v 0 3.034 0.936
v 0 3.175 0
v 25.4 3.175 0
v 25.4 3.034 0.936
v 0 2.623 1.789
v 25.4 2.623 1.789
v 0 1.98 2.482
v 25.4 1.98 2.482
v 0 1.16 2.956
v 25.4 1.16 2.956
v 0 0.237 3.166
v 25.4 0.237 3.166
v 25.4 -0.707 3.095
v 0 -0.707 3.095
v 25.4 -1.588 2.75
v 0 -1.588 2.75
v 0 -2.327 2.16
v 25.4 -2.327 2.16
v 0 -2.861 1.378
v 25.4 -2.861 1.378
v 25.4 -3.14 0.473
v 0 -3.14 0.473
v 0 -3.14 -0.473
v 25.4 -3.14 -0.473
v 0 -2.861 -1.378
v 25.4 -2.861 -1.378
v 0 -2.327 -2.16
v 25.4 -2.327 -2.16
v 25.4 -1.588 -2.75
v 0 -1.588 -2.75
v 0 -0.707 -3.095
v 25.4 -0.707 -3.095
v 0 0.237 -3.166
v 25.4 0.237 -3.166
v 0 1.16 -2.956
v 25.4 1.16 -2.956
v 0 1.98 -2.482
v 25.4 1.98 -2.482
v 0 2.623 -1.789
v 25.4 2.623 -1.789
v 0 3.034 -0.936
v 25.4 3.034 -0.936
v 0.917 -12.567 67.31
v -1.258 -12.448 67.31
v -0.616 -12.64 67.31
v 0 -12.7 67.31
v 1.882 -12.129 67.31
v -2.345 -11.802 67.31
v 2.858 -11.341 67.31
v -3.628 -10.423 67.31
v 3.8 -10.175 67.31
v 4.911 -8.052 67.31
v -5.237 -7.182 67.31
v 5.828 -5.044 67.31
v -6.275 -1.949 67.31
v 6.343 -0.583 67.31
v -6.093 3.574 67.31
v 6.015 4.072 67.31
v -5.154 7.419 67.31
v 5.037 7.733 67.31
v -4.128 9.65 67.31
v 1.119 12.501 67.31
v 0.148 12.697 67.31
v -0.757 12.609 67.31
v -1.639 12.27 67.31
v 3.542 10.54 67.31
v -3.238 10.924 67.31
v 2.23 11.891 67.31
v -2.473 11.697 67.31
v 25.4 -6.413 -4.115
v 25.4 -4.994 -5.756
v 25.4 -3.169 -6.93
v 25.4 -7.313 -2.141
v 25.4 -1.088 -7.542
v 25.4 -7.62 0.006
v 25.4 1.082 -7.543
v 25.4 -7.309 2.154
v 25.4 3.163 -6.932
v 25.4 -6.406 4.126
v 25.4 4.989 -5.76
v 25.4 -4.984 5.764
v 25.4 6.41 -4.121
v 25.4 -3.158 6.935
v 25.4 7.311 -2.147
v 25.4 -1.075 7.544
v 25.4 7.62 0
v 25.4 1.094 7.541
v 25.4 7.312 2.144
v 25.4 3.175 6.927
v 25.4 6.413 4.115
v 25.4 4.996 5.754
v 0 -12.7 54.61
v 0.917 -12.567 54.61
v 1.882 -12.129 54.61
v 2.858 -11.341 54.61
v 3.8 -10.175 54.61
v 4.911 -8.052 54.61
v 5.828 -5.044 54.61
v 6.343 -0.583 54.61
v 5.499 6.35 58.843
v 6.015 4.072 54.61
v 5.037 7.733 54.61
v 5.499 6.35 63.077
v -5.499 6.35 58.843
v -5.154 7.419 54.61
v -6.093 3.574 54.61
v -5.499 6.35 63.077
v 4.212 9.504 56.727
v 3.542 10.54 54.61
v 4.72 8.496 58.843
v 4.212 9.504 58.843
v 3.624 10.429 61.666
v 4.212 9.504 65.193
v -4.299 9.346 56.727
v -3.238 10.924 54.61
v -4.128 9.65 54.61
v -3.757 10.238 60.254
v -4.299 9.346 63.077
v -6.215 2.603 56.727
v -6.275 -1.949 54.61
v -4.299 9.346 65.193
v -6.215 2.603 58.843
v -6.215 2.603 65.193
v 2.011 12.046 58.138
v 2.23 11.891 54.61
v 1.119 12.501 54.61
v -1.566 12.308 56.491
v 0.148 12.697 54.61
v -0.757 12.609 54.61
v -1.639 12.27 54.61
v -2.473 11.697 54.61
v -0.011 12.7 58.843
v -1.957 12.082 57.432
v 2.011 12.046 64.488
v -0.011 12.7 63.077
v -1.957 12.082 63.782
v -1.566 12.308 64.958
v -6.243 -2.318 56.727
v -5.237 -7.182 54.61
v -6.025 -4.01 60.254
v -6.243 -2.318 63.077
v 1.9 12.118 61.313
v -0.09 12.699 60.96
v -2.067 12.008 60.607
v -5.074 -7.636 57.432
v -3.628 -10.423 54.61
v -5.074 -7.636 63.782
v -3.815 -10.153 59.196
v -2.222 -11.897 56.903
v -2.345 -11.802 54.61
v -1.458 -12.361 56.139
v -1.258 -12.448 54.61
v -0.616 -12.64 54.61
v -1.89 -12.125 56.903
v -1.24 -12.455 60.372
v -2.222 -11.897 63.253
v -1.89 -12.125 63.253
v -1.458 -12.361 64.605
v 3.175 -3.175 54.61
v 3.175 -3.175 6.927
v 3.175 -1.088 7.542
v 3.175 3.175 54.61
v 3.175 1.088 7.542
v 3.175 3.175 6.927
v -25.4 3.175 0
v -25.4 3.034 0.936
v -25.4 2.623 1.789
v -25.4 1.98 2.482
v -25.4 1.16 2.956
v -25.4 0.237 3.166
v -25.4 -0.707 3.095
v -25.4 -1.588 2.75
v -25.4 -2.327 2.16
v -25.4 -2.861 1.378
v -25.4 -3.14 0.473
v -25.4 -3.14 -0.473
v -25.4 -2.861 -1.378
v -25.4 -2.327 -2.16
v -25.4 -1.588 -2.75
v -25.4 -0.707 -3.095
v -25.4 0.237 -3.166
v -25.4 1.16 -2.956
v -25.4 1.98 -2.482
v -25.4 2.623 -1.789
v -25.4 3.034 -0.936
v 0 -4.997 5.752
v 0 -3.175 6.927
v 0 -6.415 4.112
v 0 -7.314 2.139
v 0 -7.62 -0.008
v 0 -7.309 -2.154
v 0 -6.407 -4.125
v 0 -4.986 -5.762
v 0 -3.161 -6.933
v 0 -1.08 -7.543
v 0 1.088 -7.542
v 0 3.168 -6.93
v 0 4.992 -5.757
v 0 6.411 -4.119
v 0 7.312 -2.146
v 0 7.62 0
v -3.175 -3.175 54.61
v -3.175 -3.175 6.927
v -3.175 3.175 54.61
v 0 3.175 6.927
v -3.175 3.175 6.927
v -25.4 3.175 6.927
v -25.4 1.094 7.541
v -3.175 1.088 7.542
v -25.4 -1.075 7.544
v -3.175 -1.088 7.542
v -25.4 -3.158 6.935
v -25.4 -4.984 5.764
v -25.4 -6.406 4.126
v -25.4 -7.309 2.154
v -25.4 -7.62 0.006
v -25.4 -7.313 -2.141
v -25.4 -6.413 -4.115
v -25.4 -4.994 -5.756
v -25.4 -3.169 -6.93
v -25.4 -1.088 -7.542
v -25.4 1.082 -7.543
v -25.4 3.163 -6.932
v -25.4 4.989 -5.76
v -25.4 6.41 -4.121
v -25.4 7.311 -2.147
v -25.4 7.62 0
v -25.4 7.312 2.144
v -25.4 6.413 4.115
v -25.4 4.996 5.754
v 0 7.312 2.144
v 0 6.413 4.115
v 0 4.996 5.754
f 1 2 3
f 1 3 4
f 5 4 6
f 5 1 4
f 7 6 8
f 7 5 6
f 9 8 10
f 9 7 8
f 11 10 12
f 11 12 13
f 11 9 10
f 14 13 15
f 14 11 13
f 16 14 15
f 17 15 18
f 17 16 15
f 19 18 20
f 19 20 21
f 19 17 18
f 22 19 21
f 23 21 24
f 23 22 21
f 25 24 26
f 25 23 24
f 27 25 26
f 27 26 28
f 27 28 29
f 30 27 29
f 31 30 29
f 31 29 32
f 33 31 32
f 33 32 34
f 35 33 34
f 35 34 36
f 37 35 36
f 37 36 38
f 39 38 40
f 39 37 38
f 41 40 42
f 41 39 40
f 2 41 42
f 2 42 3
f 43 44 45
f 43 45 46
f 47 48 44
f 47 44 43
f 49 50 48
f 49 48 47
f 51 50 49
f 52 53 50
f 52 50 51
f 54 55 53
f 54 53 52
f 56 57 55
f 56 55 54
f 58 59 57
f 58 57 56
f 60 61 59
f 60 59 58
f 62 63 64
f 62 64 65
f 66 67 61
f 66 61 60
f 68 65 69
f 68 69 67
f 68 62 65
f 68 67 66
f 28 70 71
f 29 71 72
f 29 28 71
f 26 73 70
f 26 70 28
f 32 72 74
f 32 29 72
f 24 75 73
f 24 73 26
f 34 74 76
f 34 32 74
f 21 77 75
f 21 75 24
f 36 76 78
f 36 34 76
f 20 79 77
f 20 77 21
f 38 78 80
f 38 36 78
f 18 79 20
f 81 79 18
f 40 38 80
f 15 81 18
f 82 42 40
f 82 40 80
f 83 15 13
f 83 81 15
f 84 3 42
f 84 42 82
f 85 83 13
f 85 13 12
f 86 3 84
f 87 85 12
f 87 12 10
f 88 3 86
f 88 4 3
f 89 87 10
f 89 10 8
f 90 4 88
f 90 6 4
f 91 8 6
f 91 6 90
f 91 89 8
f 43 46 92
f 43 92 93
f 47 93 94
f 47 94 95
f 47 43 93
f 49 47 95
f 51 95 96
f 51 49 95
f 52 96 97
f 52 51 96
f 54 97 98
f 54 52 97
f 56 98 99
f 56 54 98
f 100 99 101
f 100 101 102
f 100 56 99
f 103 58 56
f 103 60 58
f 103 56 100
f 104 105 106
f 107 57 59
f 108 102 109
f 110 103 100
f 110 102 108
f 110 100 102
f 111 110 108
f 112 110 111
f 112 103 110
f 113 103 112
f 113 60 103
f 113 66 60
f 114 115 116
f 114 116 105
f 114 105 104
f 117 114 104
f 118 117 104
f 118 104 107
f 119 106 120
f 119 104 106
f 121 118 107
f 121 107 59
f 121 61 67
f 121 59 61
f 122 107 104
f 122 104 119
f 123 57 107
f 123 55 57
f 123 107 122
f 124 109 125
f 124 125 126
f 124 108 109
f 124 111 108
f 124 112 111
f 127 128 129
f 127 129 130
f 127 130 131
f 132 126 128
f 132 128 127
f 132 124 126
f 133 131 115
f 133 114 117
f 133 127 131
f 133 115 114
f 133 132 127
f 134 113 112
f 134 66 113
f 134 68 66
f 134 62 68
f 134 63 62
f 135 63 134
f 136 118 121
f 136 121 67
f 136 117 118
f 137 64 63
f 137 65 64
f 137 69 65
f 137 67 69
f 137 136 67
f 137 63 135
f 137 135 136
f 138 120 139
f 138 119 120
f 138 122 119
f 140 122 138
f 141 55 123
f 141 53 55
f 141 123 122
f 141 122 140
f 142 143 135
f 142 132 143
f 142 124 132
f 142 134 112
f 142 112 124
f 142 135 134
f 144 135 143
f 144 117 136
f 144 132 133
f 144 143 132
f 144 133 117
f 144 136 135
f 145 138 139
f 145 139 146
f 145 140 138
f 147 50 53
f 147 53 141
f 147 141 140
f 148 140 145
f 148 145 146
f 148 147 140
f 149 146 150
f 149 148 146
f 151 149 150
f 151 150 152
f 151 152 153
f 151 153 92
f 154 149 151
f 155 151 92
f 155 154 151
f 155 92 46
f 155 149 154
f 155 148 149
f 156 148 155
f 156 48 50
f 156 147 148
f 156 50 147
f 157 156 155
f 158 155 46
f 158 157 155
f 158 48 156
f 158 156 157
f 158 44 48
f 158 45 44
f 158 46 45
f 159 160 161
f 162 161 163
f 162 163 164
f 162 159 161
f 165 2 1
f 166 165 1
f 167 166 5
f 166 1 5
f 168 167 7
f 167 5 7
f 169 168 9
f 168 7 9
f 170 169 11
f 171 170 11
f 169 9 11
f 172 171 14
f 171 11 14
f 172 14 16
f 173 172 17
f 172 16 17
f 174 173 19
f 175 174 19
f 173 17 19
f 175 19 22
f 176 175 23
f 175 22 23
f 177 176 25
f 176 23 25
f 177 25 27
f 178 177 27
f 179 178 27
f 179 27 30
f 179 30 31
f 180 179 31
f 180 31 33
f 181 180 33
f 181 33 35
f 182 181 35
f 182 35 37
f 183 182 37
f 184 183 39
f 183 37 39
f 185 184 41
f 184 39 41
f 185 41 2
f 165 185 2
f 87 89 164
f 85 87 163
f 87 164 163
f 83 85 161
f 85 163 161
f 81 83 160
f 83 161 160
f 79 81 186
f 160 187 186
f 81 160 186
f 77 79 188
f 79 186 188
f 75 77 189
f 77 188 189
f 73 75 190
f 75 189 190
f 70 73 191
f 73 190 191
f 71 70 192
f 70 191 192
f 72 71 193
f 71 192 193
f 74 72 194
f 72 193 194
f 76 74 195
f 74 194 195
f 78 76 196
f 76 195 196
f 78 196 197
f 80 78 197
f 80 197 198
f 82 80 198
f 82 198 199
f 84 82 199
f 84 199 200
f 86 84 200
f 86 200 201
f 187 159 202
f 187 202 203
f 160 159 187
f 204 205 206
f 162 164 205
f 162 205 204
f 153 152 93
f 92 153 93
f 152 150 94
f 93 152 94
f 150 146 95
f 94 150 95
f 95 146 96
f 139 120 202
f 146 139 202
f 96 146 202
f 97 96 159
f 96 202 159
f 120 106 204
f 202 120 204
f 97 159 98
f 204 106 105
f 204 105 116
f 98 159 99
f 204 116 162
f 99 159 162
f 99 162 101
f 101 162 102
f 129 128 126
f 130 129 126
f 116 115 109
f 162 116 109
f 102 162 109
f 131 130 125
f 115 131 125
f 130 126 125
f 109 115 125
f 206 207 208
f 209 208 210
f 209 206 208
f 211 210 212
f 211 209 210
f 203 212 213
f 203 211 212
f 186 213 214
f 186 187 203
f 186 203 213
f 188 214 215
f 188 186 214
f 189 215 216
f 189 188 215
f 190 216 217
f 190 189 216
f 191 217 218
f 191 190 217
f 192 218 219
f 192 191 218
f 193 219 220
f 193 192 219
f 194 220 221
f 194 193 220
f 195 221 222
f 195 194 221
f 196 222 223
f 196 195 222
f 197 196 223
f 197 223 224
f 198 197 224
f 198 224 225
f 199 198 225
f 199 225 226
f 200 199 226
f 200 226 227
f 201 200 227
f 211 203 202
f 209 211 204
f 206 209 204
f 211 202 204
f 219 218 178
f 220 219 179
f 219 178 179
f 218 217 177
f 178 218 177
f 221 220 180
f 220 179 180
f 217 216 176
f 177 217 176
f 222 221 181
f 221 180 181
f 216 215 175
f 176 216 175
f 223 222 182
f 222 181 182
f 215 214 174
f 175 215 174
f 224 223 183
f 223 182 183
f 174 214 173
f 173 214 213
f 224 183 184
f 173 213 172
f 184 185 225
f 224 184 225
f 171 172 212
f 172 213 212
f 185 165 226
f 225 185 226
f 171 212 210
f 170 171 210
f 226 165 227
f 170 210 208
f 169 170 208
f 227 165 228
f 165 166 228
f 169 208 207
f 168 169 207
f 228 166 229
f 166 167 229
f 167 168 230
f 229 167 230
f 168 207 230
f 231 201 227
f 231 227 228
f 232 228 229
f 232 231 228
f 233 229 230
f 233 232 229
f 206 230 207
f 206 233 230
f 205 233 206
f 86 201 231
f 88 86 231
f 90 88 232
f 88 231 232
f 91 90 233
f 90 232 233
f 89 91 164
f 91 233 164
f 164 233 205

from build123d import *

# Parameters (mm, degrees)
F0_R     = 3.175
F1_DEPTH = 25.4
F2_DEPTH = 3.175
F5_DEPTH = 12.7


with BuildPart() as f1:
    # F0 (on Right) → F1 (new body, symmetric)
    with BuildSketch(Plane.YZ):
        with BuildLine():
            ThreePointArc((-3.175, 6.9270321928), (-4.1152703435, -6.4131856359), (7.62, 0))
            ThreePointArc((7.62, 0), (6.4131856359, 4.1152703435), (3.175, 6.9270321928))
            ThreePointArc((3.175, 6.9270321928), (0, 7.62), (-3.175, 6.9270321928))
        make_face()
        Circle(F0_R, mode=Mode.SUBTRACT)
    extrude(amount=F1_DEPTH, both=True)

    # F0 (on Right) → F2 (join, symmetric)
    with BuildSketch(Plane.YZ):
        with BuildLine():
            ThreePointArc((-3.175, 6.9270321928), (0, 7.62), (3.175, 6.9270321928))
            Line((3.175, 6.9270321928), (3.175, 67.31))
            Line((3.175, 67.31), (-3.175, 67.31))
            Line((-3.175, 67.31), (-3.175, 6.9270321928))
        make_face()
    extrude(amount=F2_DEPTH, both=True)

    # F4 (on offset) → F5 (join)
    with BuildSketch(Plane.XY.offset(67.31)):
        with BuildLine():
            add(Edge.make_bspline(
                [(0, -12.7), (10.9985226281, -12.7), (5.499261314, 6.35), (0, 25.4), (-5.499261314, 6.35), (-10.9985226281, -12.7), (0, -12.7)],
                knots=[0, 0, 0, 2.0943951024, 2.0943951024, 4.1887902048, 4.1887902048, 6.2831853072, 6.2831853072, 6.2831853072], degree=2, weights=[1, 0.5, 1, 0.5, 1, 0.5, 1]))
        make_face()
    extrude(amount=-F5_DEPTH)


solid = f1.part
